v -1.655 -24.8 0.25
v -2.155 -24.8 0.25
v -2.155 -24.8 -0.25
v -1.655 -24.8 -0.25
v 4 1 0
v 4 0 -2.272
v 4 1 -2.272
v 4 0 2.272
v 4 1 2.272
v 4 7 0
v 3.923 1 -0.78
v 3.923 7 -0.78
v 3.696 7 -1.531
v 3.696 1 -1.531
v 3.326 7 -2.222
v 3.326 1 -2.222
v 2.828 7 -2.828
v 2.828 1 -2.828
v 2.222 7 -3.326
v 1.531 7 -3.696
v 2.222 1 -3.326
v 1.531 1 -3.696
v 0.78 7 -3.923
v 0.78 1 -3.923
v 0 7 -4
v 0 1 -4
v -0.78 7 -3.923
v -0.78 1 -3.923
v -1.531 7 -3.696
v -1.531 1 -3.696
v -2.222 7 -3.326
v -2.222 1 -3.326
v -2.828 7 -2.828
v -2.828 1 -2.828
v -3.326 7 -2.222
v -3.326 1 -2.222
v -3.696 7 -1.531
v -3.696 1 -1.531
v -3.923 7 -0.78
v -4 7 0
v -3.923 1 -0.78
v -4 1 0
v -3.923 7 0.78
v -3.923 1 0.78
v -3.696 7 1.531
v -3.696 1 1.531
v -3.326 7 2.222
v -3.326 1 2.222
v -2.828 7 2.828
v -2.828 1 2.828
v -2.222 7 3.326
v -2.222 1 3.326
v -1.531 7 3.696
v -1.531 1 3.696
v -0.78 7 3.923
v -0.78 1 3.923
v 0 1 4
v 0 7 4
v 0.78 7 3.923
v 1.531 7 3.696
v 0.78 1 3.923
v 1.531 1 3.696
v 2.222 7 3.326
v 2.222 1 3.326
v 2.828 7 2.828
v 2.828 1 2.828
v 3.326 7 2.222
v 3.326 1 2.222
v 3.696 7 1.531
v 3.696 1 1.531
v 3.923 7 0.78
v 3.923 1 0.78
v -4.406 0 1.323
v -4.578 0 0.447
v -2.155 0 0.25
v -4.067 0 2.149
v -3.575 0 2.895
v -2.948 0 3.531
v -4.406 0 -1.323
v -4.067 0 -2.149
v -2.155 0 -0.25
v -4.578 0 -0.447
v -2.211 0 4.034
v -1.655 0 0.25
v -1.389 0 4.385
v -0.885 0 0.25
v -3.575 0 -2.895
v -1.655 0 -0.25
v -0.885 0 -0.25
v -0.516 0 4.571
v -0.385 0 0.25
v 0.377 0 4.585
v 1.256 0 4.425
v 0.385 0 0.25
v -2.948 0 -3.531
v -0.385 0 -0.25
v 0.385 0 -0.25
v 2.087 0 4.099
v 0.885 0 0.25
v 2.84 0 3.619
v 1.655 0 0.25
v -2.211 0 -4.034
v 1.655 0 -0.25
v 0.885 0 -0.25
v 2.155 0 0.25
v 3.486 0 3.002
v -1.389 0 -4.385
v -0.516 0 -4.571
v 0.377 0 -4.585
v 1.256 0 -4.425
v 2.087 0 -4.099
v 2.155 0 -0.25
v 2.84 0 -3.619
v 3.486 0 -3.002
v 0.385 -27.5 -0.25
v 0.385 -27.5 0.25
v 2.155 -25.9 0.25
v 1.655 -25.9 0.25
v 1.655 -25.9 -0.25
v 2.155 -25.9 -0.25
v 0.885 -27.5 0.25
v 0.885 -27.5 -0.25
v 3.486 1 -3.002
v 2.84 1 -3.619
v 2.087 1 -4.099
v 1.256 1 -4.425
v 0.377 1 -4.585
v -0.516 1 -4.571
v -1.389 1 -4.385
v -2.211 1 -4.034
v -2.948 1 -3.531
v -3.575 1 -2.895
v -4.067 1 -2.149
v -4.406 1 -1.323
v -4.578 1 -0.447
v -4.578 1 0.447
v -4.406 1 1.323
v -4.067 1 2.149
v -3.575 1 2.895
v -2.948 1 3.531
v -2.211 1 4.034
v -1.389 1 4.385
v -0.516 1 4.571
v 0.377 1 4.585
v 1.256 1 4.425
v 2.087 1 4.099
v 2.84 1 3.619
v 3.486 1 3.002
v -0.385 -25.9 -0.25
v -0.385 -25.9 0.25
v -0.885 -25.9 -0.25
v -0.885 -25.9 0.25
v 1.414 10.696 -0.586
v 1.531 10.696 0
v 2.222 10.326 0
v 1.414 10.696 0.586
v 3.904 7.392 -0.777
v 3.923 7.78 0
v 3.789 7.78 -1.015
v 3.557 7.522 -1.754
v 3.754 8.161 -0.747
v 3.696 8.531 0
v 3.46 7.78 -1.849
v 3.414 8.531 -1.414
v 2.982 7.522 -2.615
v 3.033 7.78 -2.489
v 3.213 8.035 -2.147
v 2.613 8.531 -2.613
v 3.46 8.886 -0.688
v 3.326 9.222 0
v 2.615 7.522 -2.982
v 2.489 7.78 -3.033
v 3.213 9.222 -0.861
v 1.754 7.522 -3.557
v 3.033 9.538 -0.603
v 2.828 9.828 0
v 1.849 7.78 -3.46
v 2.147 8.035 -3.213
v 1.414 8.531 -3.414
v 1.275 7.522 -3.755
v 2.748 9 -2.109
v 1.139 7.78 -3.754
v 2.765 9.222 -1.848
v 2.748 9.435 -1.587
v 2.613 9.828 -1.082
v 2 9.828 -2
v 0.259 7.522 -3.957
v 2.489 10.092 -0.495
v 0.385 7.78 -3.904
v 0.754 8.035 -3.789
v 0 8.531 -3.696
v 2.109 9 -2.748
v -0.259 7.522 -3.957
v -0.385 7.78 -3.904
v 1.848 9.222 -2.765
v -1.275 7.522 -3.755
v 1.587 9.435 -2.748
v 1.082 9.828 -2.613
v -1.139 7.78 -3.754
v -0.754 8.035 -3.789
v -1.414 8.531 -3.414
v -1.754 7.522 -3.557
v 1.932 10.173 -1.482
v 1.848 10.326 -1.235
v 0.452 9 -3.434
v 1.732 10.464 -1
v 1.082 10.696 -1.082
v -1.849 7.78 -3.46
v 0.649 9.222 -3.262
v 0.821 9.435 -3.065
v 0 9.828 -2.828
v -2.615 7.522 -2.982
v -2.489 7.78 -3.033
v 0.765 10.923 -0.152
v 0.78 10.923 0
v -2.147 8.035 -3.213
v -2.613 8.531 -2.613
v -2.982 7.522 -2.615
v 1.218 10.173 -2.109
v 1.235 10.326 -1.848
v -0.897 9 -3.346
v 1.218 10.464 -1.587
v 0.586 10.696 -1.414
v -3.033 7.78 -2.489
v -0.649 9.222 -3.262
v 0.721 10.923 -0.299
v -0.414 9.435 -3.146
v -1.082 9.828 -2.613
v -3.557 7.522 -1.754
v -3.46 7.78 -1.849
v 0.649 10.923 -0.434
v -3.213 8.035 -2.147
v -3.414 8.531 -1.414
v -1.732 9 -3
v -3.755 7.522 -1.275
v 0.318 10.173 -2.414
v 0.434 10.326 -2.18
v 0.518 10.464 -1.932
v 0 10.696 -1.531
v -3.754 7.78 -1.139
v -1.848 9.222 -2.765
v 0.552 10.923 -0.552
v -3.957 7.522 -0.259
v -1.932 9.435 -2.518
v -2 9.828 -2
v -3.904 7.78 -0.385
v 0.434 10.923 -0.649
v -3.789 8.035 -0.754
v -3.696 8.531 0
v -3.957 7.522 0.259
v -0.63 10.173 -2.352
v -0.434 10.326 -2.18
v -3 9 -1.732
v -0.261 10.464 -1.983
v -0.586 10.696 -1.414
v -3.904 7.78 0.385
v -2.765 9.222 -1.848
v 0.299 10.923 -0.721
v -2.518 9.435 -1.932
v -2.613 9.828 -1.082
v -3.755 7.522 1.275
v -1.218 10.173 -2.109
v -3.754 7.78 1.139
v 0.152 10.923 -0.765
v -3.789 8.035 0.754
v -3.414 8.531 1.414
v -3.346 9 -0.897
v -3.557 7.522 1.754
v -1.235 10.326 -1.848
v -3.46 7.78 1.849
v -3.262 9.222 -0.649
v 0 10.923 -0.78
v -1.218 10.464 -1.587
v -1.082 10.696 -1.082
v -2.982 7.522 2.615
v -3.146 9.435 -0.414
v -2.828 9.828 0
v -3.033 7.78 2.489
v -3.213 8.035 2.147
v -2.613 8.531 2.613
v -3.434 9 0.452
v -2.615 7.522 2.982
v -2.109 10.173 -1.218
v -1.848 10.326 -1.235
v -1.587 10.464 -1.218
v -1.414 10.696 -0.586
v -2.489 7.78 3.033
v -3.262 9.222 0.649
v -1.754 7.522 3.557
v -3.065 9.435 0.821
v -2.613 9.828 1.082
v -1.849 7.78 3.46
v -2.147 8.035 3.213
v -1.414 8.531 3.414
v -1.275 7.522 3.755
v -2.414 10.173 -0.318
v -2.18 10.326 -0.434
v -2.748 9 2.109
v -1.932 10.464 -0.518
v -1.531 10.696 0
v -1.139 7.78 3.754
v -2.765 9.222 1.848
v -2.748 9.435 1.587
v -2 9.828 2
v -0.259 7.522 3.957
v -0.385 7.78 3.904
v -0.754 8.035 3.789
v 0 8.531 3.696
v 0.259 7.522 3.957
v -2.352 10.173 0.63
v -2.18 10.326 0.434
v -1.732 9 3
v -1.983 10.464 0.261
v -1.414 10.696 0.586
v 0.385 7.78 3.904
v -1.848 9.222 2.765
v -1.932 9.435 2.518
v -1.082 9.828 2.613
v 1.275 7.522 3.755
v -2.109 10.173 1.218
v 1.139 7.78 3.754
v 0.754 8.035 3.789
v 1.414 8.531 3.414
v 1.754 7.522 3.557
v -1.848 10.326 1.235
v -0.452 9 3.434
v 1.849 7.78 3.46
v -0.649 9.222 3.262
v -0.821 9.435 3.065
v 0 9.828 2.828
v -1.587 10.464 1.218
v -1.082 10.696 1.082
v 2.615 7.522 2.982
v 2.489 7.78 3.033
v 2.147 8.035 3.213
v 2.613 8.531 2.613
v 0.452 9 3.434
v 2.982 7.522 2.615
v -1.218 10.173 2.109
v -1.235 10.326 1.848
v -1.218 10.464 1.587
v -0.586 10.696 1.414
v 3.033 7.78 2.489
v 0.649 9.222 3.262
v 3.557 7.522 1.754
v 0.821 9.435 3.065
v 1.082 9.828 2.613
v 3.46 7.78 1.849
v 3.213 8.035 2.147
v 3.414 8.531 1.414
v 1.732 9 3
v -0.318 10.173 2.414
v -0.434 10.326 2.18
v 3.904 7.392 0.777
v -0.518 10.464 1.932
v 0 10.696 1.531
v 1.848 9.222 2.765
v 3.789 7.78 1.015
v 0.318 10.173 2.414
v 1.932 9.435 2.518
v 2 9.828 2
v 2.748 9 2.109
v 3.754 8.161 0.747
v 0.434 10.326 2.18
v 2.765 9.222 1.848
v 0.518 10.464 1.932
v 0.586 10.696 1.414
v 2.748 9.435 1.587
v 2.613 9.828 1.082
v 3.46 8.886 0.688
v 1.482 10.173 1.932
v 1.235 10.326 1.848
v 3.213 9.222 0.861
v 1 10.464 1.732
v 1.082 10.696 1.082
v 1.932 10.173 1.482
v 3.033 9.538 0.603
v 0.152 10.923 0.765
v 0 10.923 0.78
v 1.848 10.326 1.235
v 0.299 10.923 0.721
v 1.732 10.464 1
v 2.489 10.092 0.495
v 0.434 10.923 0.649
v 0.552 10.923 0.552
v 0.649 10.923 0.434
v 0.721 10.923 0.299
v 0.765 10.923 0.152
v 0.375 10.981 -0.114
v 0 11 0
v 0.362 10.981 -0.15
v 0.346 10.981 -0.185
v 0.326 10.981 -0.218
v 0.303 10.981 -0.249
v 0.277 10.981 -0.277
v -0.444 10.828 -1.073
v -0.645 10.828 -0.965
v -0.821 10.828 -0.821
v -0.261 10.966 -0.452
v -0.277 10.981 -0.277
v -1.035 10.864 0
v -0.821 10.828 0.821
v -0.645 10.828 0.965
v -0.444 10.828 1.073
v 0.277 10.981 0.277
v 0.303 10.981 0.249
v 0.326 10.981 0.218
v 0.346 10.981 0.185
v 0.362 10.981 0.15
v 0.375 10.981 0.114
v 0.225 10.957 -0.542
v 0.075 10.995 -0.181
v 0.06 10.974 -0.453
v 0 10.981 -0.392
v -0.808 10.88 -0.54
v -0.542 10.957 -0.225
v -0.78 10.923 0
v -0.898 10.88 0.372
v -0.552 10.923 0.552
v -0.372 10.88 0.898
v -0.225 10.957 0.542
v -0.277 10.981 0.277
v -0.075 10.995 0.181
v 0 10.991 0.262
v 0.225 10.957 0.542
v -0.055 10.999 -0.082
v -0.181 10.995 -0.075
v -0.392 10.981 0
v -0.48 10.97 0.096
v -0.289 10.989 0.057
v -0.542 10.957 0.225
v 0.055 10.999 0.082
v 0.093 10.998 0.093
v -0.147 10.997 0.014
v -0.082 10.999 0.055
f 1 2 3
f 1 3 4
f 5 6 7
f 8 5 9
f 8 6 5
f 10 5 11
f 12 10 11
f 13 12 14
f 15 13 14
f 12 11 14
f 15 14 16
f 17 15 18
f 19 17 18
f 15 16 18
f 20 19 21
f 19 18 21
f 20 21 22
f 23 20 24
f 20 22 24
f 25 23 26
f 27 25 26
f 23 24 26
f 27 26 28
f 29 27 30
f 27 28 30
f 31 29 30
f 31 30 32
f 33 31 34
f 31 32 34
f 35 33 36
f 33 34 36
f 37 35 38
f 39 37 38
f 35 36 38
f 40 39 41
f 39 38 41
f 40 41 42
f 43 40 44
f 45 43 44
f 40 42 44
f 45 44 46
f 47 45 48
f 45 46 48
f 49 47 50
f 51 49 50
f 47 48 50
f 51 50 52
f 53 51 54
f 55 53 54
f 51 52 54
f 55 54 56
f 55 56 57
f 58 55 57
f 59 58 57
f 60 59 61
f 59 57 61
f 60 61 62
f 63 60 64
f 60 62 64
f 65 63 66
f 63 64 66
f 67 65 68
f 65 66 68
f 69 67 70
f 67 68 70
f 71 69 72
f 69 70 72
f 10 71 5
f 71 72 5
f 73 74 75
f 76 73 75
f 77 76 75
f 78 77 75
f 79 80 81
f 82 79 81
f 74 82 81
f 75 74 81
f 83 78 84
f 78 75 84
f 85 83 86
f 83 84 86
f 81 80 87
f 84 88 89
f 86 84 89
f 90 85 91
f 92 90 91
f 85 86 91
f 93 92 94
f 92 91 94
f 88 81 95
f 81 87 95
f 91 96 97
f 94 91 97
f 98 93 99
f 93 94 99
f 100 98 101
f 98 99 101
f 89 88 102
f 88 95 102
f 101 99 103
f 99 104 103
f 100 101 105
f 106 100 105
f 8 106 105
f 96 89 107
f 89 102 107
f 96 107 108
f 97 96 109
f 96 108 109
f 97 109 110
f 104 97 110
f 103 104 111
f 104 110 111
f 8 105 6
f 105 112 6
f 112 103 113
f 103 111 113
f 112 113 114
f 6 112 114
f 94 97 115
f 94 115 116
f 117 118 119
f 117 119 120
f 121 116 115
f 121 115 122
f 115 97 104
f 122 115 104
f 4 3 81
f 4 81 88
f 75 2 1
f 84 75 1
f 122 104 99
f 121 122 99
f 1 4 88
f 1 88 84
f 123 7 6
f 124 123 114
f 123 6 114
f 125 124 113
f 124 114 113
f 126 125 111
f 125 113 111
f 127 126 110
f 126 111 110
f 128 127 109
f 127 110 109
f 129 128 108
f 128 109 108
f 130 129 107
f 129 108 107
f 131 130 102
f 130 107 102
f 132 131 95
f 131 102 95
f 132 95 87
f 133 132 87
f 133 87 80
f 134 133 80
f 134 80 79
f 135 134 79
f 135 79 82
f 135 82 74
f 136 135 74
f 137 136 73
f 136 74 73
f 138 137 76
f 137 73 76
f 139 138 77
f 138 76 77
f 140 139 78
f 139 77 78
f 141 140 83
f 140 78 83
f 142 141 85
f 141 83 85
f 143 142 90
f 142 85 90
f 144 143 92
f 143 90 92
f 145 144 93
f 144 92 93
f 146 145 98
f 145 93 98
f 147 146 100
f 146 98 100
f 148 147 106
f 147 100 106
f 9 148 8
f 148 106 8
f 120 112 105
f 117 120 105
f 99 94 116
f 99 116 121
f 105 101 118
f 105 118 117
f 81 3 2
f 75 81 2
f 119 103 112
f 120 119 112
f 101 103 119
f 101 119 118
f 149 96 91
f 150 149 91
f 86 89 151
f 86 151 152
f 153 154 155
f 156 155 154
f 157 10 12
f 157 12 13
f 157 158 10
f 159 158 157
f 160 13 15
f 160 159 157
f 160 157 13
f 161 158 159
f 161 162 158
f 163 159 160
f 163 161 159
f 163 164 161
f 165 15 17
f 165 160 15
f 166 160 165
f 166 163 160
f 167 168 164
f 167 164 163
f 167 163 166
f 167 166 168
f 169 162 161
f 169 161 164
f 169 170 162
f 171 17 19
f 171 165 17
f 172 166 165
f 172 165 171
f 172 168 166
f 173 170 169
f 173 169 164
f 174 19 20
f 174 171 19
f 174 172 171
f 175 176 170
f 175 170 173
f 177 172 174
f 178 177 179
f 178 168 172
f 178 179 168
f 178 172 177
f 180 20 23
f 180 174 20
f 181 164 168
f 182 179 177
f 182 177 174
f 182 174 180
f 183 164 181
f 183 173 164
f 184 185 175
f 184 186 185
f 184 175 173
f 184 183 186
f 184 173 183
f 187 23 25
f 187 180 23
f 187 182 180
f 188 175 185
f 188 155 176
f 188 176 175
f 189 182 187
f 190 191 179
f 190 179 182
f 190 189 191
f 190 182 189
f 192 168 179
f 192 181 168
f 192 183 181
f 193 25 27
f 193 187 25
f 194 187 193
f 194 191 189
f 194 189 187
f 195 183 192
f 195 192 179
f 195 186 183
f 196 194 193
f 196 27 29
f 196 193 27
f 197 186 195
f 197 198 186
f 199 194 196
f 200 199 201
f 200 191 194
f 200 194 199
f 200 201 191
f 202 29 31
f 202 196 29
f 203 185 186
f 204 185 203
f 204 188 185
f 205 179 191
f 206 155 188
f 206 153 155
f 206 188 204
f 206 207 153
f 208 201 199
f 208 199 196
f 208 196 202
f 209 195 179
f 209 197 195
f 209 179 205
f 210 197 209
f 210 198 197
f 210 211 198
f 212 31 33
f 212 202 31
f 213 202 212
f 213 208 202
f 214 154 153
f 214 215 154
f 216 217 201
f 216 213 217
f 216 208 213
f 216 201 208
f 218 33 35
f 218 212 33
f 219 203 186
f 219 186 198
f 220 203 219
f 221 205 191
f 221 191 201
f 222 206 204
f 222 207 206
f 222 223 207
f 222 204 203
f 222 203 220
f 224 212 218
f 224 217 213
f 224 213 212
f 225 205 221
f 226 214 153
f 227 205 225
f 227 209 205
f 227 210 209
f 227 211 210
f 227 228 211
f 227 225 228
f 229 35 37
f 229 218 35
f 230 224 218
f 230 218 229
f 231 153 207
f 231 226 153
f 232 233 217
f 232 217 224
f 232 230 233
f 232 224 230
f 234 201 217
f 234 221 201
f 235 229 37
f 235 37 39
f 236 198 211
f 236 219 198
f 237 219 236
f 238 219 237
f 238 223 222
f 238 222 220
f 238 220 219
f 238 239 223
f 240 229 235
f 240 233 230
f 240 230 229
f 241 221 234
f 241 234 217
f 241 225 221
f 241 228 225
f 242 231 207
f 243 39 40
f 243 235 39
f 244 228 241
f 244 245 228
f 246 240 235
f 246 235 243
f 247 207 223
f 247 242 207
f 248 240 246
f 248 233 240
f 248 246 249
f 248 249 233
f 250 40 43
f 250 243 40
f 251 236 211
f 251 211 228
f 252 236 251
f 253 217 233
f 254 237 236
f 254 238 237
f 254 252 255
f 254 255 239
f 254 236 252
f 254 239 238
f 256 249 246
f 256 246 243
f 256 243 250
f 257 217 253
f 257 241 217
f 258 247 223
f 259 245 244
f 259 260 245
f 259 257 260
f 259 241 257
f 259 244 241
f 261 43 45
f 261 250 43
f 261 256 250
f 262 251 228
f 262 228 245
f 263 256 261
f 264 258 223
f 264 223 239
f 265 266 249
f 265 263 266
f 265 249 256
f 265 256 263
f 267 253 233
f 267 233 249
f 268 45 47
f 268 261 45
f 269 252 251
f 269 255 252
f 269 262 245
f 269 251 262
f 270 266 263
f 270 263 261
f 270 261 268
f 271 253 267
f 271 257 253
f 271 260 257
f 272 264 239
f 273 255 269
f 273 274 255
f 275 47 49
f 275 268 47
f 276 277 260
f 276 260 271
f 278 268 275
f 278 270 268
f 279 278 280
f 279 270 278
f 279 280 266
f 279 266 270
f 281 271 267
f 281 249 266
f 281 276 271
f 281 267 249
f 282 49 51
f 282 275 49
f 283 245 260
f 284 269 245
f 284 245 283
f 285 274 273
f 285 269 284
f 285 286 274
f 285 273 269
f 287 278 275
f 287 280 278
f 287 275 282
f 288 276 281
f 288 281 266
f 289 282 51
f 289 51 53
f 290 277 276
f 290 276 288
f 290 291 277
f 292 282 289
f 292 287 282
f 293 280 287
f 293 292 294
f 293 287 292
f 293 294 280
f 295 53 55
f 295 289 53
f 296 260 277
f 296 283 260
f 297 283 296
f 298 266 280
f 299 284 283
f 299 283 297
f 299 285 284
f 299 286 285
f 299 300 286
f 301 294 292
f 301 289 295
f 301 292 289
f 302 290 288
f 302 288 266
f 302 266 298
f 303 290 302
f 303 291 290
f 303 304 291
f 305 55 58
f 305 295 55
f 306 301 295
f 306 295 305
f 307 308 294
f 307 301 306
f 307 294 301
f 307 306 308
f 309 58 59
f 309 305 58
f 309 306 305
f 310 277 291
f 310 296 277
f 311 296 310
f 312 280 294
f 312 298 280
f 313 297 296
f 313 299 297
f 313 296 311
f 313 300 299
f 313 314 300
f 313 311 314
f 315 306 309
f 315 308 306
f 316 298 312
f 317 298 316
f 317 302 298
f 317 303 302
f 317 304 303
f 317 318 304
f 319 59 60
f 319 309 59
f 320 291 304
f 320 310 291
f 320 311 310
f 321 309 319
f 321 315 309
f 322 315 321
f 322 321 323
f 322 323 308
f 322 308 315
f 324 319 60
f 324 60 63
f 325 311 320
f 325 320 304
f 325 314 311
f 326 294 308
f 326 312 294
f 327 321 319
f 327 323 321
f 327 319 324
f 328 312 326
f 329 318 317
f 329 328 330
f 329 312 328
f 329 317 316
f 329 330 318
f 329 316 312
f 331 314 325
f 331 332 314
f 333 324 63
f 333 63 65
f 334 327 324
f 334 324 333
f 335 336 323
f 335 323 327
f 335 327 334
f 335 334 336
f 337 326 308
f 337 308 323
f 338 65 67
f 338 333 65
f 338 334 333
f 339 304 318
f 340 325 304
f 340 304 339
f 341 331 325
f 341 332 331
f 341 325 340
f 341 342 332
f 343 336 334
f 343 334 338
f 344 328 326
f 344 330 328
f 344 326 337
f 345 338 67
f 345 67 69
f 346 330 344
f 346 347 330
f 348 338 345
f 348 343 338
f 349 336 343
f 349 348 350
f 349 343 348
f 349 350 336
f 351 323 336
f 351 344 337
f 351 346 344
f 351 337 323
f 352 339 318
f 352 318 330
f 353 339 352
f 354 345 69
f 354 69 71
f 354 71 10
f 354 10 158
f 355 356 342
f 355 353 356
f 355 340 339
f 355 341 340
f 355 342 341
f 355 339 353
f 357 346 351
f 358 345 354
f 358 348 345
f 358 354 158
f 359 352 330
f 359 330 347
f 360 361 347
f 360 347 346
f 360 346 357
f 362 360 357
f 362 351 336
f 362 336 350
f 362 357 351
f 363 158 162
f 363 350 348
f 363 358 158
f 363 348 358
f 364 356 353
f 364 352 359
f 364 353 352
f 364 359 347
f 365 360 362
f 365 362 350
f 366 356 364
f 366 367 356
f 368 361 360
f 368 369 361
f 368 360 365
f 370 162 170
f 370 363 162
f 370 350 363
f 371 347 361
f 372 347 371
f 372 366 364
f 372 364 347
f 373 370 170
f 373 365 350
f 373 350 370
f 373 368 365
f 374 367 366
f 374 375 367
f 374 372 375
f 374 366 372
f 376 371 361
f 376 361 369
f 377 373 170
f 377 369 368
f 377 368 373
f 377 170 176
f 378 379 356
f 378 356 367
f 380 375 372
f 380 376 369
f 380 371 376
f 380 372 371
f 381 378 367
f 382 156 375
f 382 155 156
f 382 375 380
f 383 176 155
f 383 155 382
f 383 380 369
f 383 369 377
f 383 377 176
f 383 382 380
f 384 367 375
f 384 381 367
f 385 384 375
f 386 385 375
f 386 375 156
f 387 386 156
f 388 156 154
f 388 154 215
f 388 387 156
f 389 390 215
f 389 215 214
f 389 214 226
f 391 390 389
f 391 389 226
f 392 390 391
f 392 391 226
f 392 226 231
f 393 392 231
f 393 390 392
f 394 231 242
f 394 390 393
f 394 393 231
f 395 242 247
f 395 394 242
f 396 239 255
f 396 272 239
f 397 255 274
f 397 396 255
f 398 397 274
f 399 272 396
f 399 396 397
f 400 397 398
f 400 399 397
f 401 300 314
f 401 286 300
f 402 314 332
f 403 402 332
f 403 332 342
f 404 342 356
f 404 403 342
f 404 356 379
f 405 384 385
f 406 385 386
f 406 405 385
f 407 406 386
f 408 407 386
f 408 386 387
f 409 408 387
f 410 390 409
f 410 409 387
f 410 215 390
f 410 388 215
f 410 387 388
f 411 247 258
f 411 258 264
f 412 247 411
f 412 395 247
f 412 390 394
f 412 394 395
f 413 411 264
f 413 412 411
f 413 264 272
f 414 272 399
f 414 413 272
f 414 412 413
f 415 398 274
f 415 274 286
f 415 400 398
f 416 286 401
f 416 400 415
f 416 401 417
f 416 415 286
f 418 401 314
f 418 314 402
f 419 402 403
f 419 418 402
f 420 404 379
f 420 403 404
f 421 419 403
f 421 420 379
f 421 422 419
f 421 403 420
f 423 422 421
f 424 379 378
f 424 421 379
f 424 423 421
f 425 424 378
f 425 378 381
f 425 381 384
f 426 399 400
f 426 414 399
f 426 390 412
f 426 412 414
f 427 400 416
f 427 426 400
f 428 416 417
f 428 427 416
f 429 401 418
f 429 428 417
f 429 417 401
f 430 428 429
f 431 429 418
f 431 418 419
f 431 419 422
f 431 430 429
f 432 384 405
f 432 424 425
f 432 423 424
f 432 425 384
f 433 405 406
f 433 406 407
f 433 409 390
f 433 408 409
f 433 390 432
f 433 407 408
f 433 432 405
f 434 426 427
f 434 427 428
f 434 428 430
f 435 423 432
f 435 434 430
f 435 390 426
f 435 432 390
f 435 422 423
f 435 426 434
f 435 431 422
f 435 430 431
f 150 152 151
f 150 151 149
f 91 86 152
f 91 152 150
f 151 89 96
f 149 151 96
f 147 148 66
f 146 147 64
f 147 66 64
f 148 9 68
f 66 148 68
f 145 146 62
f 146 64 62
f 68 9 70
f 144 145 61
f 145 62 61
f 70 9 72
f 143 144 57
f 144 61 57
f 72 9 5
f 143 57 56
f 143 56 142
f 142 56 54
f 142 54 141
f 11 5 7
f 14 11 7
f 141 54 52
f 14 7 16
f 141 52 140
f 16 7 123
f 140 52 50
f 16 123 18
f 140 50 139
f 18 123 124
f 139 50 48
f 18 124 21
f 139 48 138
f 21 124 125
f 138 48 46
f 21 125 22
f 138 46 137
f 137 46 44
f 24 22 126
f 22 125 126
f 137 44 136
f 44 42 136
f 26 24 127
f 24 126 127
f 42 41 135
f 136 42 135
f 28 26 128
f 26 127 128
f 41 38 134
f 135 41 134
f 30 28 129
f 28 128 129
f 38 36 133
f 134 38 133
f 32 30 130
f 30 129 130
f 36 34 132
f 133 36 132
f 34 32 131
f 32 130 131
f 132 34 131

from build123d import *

# Parameters (mm, degrees)
SKETCH001_W     = 0.5
SKETCH001_H     = 0.5
PAD_DEPTH       = 27.5
SKETCH002_W     = 1
SKETCH002_H     = 6.098212
POCKET_DEPTH    = 5
SKETCH003_W     = 0.5
SKETCH003_H     = 0.5
POCKET001_DEPTH = 2.7
SKETCH004_W     = 0.5
SKETCH004_H     = 0.5
POCKET002_DEPTH = 1.6


with BuildPart() as part:
    # Sketch → Revolution (revolve)
    with BuildSketch(Plane.XY):
        with BuildLine():
            ThreePointArc((4, 7), (2.828427, 9.828427), (0, 11))
            Line((0, 0), (0, 11))
            Line((4.6, 0), (0, 0))
            Line((4.6, 1), (4.6, 0))
            Line((4, 1), (4.6, 1))
            Line((4, 7), (4, 1))
        make_face()
    revolve(axis=Axis((0, 0, 0), (0, 1, 0)))

    # Sketch001 (on Face2 of Revolution) → Pad (new body)
    with BuildSketch(Plane.XZ):
        with Locations((0.635, 0)):
            Rectangle(SKETCH001_W, SKETCH001_H)
        with Locations((1.905, 0)):
            Rectangle(SKETCH001_W, SKETCH001_H)
        with Locations((-0.635, 0)):
            Rectangle(SKETCH001_W, SKETCH001_H)
        with Locations((-1.905, 0)):
            Rectangle(SKETCH001_W, SKETCH001_H)
    extrude(amount=PAD_DEPTH)

    # Sketch002 (on Face5 of Pad) → Pocket (cut)
    with BuildSketch(Plane.XZ):
        with Locations((4.5, 0)):
            Rectangle(SKETCH002_W, SKETCH002_H)
    extrude(amount=-POCKET_DEPTH, mode=Mode.SUBTRACT)

    # Sketch003 (on Face23 of Pocket) → Pocket001 (cut)
    with BuildSketch(Plane.XZ.offset(27.5)):
        with Locations((-1.905, 0)):
            Rectangle(SKETCH003_W, SKETCH003_H)
    extrude(amount=-POCKET001_DEPTH, mode=Mode.SUBTRACT)

    # Sketch004 (on Face24 of Pocket001) → Pocket002 (cut)
    with BuildSketch(Plane.XZ.offset(27.5)):
        with Locations((-0.635, 0)):
            Rectangle(SKETCH004_W, SKETCH004_H)
        with Locations((1.905, 0)):
            Rectangle(SKETCH004_W, SKETCH004_H)
    extrude(amount=-POCKET002_DEPTH, mode=Mode.SUBTRACT)


solid = part.part
